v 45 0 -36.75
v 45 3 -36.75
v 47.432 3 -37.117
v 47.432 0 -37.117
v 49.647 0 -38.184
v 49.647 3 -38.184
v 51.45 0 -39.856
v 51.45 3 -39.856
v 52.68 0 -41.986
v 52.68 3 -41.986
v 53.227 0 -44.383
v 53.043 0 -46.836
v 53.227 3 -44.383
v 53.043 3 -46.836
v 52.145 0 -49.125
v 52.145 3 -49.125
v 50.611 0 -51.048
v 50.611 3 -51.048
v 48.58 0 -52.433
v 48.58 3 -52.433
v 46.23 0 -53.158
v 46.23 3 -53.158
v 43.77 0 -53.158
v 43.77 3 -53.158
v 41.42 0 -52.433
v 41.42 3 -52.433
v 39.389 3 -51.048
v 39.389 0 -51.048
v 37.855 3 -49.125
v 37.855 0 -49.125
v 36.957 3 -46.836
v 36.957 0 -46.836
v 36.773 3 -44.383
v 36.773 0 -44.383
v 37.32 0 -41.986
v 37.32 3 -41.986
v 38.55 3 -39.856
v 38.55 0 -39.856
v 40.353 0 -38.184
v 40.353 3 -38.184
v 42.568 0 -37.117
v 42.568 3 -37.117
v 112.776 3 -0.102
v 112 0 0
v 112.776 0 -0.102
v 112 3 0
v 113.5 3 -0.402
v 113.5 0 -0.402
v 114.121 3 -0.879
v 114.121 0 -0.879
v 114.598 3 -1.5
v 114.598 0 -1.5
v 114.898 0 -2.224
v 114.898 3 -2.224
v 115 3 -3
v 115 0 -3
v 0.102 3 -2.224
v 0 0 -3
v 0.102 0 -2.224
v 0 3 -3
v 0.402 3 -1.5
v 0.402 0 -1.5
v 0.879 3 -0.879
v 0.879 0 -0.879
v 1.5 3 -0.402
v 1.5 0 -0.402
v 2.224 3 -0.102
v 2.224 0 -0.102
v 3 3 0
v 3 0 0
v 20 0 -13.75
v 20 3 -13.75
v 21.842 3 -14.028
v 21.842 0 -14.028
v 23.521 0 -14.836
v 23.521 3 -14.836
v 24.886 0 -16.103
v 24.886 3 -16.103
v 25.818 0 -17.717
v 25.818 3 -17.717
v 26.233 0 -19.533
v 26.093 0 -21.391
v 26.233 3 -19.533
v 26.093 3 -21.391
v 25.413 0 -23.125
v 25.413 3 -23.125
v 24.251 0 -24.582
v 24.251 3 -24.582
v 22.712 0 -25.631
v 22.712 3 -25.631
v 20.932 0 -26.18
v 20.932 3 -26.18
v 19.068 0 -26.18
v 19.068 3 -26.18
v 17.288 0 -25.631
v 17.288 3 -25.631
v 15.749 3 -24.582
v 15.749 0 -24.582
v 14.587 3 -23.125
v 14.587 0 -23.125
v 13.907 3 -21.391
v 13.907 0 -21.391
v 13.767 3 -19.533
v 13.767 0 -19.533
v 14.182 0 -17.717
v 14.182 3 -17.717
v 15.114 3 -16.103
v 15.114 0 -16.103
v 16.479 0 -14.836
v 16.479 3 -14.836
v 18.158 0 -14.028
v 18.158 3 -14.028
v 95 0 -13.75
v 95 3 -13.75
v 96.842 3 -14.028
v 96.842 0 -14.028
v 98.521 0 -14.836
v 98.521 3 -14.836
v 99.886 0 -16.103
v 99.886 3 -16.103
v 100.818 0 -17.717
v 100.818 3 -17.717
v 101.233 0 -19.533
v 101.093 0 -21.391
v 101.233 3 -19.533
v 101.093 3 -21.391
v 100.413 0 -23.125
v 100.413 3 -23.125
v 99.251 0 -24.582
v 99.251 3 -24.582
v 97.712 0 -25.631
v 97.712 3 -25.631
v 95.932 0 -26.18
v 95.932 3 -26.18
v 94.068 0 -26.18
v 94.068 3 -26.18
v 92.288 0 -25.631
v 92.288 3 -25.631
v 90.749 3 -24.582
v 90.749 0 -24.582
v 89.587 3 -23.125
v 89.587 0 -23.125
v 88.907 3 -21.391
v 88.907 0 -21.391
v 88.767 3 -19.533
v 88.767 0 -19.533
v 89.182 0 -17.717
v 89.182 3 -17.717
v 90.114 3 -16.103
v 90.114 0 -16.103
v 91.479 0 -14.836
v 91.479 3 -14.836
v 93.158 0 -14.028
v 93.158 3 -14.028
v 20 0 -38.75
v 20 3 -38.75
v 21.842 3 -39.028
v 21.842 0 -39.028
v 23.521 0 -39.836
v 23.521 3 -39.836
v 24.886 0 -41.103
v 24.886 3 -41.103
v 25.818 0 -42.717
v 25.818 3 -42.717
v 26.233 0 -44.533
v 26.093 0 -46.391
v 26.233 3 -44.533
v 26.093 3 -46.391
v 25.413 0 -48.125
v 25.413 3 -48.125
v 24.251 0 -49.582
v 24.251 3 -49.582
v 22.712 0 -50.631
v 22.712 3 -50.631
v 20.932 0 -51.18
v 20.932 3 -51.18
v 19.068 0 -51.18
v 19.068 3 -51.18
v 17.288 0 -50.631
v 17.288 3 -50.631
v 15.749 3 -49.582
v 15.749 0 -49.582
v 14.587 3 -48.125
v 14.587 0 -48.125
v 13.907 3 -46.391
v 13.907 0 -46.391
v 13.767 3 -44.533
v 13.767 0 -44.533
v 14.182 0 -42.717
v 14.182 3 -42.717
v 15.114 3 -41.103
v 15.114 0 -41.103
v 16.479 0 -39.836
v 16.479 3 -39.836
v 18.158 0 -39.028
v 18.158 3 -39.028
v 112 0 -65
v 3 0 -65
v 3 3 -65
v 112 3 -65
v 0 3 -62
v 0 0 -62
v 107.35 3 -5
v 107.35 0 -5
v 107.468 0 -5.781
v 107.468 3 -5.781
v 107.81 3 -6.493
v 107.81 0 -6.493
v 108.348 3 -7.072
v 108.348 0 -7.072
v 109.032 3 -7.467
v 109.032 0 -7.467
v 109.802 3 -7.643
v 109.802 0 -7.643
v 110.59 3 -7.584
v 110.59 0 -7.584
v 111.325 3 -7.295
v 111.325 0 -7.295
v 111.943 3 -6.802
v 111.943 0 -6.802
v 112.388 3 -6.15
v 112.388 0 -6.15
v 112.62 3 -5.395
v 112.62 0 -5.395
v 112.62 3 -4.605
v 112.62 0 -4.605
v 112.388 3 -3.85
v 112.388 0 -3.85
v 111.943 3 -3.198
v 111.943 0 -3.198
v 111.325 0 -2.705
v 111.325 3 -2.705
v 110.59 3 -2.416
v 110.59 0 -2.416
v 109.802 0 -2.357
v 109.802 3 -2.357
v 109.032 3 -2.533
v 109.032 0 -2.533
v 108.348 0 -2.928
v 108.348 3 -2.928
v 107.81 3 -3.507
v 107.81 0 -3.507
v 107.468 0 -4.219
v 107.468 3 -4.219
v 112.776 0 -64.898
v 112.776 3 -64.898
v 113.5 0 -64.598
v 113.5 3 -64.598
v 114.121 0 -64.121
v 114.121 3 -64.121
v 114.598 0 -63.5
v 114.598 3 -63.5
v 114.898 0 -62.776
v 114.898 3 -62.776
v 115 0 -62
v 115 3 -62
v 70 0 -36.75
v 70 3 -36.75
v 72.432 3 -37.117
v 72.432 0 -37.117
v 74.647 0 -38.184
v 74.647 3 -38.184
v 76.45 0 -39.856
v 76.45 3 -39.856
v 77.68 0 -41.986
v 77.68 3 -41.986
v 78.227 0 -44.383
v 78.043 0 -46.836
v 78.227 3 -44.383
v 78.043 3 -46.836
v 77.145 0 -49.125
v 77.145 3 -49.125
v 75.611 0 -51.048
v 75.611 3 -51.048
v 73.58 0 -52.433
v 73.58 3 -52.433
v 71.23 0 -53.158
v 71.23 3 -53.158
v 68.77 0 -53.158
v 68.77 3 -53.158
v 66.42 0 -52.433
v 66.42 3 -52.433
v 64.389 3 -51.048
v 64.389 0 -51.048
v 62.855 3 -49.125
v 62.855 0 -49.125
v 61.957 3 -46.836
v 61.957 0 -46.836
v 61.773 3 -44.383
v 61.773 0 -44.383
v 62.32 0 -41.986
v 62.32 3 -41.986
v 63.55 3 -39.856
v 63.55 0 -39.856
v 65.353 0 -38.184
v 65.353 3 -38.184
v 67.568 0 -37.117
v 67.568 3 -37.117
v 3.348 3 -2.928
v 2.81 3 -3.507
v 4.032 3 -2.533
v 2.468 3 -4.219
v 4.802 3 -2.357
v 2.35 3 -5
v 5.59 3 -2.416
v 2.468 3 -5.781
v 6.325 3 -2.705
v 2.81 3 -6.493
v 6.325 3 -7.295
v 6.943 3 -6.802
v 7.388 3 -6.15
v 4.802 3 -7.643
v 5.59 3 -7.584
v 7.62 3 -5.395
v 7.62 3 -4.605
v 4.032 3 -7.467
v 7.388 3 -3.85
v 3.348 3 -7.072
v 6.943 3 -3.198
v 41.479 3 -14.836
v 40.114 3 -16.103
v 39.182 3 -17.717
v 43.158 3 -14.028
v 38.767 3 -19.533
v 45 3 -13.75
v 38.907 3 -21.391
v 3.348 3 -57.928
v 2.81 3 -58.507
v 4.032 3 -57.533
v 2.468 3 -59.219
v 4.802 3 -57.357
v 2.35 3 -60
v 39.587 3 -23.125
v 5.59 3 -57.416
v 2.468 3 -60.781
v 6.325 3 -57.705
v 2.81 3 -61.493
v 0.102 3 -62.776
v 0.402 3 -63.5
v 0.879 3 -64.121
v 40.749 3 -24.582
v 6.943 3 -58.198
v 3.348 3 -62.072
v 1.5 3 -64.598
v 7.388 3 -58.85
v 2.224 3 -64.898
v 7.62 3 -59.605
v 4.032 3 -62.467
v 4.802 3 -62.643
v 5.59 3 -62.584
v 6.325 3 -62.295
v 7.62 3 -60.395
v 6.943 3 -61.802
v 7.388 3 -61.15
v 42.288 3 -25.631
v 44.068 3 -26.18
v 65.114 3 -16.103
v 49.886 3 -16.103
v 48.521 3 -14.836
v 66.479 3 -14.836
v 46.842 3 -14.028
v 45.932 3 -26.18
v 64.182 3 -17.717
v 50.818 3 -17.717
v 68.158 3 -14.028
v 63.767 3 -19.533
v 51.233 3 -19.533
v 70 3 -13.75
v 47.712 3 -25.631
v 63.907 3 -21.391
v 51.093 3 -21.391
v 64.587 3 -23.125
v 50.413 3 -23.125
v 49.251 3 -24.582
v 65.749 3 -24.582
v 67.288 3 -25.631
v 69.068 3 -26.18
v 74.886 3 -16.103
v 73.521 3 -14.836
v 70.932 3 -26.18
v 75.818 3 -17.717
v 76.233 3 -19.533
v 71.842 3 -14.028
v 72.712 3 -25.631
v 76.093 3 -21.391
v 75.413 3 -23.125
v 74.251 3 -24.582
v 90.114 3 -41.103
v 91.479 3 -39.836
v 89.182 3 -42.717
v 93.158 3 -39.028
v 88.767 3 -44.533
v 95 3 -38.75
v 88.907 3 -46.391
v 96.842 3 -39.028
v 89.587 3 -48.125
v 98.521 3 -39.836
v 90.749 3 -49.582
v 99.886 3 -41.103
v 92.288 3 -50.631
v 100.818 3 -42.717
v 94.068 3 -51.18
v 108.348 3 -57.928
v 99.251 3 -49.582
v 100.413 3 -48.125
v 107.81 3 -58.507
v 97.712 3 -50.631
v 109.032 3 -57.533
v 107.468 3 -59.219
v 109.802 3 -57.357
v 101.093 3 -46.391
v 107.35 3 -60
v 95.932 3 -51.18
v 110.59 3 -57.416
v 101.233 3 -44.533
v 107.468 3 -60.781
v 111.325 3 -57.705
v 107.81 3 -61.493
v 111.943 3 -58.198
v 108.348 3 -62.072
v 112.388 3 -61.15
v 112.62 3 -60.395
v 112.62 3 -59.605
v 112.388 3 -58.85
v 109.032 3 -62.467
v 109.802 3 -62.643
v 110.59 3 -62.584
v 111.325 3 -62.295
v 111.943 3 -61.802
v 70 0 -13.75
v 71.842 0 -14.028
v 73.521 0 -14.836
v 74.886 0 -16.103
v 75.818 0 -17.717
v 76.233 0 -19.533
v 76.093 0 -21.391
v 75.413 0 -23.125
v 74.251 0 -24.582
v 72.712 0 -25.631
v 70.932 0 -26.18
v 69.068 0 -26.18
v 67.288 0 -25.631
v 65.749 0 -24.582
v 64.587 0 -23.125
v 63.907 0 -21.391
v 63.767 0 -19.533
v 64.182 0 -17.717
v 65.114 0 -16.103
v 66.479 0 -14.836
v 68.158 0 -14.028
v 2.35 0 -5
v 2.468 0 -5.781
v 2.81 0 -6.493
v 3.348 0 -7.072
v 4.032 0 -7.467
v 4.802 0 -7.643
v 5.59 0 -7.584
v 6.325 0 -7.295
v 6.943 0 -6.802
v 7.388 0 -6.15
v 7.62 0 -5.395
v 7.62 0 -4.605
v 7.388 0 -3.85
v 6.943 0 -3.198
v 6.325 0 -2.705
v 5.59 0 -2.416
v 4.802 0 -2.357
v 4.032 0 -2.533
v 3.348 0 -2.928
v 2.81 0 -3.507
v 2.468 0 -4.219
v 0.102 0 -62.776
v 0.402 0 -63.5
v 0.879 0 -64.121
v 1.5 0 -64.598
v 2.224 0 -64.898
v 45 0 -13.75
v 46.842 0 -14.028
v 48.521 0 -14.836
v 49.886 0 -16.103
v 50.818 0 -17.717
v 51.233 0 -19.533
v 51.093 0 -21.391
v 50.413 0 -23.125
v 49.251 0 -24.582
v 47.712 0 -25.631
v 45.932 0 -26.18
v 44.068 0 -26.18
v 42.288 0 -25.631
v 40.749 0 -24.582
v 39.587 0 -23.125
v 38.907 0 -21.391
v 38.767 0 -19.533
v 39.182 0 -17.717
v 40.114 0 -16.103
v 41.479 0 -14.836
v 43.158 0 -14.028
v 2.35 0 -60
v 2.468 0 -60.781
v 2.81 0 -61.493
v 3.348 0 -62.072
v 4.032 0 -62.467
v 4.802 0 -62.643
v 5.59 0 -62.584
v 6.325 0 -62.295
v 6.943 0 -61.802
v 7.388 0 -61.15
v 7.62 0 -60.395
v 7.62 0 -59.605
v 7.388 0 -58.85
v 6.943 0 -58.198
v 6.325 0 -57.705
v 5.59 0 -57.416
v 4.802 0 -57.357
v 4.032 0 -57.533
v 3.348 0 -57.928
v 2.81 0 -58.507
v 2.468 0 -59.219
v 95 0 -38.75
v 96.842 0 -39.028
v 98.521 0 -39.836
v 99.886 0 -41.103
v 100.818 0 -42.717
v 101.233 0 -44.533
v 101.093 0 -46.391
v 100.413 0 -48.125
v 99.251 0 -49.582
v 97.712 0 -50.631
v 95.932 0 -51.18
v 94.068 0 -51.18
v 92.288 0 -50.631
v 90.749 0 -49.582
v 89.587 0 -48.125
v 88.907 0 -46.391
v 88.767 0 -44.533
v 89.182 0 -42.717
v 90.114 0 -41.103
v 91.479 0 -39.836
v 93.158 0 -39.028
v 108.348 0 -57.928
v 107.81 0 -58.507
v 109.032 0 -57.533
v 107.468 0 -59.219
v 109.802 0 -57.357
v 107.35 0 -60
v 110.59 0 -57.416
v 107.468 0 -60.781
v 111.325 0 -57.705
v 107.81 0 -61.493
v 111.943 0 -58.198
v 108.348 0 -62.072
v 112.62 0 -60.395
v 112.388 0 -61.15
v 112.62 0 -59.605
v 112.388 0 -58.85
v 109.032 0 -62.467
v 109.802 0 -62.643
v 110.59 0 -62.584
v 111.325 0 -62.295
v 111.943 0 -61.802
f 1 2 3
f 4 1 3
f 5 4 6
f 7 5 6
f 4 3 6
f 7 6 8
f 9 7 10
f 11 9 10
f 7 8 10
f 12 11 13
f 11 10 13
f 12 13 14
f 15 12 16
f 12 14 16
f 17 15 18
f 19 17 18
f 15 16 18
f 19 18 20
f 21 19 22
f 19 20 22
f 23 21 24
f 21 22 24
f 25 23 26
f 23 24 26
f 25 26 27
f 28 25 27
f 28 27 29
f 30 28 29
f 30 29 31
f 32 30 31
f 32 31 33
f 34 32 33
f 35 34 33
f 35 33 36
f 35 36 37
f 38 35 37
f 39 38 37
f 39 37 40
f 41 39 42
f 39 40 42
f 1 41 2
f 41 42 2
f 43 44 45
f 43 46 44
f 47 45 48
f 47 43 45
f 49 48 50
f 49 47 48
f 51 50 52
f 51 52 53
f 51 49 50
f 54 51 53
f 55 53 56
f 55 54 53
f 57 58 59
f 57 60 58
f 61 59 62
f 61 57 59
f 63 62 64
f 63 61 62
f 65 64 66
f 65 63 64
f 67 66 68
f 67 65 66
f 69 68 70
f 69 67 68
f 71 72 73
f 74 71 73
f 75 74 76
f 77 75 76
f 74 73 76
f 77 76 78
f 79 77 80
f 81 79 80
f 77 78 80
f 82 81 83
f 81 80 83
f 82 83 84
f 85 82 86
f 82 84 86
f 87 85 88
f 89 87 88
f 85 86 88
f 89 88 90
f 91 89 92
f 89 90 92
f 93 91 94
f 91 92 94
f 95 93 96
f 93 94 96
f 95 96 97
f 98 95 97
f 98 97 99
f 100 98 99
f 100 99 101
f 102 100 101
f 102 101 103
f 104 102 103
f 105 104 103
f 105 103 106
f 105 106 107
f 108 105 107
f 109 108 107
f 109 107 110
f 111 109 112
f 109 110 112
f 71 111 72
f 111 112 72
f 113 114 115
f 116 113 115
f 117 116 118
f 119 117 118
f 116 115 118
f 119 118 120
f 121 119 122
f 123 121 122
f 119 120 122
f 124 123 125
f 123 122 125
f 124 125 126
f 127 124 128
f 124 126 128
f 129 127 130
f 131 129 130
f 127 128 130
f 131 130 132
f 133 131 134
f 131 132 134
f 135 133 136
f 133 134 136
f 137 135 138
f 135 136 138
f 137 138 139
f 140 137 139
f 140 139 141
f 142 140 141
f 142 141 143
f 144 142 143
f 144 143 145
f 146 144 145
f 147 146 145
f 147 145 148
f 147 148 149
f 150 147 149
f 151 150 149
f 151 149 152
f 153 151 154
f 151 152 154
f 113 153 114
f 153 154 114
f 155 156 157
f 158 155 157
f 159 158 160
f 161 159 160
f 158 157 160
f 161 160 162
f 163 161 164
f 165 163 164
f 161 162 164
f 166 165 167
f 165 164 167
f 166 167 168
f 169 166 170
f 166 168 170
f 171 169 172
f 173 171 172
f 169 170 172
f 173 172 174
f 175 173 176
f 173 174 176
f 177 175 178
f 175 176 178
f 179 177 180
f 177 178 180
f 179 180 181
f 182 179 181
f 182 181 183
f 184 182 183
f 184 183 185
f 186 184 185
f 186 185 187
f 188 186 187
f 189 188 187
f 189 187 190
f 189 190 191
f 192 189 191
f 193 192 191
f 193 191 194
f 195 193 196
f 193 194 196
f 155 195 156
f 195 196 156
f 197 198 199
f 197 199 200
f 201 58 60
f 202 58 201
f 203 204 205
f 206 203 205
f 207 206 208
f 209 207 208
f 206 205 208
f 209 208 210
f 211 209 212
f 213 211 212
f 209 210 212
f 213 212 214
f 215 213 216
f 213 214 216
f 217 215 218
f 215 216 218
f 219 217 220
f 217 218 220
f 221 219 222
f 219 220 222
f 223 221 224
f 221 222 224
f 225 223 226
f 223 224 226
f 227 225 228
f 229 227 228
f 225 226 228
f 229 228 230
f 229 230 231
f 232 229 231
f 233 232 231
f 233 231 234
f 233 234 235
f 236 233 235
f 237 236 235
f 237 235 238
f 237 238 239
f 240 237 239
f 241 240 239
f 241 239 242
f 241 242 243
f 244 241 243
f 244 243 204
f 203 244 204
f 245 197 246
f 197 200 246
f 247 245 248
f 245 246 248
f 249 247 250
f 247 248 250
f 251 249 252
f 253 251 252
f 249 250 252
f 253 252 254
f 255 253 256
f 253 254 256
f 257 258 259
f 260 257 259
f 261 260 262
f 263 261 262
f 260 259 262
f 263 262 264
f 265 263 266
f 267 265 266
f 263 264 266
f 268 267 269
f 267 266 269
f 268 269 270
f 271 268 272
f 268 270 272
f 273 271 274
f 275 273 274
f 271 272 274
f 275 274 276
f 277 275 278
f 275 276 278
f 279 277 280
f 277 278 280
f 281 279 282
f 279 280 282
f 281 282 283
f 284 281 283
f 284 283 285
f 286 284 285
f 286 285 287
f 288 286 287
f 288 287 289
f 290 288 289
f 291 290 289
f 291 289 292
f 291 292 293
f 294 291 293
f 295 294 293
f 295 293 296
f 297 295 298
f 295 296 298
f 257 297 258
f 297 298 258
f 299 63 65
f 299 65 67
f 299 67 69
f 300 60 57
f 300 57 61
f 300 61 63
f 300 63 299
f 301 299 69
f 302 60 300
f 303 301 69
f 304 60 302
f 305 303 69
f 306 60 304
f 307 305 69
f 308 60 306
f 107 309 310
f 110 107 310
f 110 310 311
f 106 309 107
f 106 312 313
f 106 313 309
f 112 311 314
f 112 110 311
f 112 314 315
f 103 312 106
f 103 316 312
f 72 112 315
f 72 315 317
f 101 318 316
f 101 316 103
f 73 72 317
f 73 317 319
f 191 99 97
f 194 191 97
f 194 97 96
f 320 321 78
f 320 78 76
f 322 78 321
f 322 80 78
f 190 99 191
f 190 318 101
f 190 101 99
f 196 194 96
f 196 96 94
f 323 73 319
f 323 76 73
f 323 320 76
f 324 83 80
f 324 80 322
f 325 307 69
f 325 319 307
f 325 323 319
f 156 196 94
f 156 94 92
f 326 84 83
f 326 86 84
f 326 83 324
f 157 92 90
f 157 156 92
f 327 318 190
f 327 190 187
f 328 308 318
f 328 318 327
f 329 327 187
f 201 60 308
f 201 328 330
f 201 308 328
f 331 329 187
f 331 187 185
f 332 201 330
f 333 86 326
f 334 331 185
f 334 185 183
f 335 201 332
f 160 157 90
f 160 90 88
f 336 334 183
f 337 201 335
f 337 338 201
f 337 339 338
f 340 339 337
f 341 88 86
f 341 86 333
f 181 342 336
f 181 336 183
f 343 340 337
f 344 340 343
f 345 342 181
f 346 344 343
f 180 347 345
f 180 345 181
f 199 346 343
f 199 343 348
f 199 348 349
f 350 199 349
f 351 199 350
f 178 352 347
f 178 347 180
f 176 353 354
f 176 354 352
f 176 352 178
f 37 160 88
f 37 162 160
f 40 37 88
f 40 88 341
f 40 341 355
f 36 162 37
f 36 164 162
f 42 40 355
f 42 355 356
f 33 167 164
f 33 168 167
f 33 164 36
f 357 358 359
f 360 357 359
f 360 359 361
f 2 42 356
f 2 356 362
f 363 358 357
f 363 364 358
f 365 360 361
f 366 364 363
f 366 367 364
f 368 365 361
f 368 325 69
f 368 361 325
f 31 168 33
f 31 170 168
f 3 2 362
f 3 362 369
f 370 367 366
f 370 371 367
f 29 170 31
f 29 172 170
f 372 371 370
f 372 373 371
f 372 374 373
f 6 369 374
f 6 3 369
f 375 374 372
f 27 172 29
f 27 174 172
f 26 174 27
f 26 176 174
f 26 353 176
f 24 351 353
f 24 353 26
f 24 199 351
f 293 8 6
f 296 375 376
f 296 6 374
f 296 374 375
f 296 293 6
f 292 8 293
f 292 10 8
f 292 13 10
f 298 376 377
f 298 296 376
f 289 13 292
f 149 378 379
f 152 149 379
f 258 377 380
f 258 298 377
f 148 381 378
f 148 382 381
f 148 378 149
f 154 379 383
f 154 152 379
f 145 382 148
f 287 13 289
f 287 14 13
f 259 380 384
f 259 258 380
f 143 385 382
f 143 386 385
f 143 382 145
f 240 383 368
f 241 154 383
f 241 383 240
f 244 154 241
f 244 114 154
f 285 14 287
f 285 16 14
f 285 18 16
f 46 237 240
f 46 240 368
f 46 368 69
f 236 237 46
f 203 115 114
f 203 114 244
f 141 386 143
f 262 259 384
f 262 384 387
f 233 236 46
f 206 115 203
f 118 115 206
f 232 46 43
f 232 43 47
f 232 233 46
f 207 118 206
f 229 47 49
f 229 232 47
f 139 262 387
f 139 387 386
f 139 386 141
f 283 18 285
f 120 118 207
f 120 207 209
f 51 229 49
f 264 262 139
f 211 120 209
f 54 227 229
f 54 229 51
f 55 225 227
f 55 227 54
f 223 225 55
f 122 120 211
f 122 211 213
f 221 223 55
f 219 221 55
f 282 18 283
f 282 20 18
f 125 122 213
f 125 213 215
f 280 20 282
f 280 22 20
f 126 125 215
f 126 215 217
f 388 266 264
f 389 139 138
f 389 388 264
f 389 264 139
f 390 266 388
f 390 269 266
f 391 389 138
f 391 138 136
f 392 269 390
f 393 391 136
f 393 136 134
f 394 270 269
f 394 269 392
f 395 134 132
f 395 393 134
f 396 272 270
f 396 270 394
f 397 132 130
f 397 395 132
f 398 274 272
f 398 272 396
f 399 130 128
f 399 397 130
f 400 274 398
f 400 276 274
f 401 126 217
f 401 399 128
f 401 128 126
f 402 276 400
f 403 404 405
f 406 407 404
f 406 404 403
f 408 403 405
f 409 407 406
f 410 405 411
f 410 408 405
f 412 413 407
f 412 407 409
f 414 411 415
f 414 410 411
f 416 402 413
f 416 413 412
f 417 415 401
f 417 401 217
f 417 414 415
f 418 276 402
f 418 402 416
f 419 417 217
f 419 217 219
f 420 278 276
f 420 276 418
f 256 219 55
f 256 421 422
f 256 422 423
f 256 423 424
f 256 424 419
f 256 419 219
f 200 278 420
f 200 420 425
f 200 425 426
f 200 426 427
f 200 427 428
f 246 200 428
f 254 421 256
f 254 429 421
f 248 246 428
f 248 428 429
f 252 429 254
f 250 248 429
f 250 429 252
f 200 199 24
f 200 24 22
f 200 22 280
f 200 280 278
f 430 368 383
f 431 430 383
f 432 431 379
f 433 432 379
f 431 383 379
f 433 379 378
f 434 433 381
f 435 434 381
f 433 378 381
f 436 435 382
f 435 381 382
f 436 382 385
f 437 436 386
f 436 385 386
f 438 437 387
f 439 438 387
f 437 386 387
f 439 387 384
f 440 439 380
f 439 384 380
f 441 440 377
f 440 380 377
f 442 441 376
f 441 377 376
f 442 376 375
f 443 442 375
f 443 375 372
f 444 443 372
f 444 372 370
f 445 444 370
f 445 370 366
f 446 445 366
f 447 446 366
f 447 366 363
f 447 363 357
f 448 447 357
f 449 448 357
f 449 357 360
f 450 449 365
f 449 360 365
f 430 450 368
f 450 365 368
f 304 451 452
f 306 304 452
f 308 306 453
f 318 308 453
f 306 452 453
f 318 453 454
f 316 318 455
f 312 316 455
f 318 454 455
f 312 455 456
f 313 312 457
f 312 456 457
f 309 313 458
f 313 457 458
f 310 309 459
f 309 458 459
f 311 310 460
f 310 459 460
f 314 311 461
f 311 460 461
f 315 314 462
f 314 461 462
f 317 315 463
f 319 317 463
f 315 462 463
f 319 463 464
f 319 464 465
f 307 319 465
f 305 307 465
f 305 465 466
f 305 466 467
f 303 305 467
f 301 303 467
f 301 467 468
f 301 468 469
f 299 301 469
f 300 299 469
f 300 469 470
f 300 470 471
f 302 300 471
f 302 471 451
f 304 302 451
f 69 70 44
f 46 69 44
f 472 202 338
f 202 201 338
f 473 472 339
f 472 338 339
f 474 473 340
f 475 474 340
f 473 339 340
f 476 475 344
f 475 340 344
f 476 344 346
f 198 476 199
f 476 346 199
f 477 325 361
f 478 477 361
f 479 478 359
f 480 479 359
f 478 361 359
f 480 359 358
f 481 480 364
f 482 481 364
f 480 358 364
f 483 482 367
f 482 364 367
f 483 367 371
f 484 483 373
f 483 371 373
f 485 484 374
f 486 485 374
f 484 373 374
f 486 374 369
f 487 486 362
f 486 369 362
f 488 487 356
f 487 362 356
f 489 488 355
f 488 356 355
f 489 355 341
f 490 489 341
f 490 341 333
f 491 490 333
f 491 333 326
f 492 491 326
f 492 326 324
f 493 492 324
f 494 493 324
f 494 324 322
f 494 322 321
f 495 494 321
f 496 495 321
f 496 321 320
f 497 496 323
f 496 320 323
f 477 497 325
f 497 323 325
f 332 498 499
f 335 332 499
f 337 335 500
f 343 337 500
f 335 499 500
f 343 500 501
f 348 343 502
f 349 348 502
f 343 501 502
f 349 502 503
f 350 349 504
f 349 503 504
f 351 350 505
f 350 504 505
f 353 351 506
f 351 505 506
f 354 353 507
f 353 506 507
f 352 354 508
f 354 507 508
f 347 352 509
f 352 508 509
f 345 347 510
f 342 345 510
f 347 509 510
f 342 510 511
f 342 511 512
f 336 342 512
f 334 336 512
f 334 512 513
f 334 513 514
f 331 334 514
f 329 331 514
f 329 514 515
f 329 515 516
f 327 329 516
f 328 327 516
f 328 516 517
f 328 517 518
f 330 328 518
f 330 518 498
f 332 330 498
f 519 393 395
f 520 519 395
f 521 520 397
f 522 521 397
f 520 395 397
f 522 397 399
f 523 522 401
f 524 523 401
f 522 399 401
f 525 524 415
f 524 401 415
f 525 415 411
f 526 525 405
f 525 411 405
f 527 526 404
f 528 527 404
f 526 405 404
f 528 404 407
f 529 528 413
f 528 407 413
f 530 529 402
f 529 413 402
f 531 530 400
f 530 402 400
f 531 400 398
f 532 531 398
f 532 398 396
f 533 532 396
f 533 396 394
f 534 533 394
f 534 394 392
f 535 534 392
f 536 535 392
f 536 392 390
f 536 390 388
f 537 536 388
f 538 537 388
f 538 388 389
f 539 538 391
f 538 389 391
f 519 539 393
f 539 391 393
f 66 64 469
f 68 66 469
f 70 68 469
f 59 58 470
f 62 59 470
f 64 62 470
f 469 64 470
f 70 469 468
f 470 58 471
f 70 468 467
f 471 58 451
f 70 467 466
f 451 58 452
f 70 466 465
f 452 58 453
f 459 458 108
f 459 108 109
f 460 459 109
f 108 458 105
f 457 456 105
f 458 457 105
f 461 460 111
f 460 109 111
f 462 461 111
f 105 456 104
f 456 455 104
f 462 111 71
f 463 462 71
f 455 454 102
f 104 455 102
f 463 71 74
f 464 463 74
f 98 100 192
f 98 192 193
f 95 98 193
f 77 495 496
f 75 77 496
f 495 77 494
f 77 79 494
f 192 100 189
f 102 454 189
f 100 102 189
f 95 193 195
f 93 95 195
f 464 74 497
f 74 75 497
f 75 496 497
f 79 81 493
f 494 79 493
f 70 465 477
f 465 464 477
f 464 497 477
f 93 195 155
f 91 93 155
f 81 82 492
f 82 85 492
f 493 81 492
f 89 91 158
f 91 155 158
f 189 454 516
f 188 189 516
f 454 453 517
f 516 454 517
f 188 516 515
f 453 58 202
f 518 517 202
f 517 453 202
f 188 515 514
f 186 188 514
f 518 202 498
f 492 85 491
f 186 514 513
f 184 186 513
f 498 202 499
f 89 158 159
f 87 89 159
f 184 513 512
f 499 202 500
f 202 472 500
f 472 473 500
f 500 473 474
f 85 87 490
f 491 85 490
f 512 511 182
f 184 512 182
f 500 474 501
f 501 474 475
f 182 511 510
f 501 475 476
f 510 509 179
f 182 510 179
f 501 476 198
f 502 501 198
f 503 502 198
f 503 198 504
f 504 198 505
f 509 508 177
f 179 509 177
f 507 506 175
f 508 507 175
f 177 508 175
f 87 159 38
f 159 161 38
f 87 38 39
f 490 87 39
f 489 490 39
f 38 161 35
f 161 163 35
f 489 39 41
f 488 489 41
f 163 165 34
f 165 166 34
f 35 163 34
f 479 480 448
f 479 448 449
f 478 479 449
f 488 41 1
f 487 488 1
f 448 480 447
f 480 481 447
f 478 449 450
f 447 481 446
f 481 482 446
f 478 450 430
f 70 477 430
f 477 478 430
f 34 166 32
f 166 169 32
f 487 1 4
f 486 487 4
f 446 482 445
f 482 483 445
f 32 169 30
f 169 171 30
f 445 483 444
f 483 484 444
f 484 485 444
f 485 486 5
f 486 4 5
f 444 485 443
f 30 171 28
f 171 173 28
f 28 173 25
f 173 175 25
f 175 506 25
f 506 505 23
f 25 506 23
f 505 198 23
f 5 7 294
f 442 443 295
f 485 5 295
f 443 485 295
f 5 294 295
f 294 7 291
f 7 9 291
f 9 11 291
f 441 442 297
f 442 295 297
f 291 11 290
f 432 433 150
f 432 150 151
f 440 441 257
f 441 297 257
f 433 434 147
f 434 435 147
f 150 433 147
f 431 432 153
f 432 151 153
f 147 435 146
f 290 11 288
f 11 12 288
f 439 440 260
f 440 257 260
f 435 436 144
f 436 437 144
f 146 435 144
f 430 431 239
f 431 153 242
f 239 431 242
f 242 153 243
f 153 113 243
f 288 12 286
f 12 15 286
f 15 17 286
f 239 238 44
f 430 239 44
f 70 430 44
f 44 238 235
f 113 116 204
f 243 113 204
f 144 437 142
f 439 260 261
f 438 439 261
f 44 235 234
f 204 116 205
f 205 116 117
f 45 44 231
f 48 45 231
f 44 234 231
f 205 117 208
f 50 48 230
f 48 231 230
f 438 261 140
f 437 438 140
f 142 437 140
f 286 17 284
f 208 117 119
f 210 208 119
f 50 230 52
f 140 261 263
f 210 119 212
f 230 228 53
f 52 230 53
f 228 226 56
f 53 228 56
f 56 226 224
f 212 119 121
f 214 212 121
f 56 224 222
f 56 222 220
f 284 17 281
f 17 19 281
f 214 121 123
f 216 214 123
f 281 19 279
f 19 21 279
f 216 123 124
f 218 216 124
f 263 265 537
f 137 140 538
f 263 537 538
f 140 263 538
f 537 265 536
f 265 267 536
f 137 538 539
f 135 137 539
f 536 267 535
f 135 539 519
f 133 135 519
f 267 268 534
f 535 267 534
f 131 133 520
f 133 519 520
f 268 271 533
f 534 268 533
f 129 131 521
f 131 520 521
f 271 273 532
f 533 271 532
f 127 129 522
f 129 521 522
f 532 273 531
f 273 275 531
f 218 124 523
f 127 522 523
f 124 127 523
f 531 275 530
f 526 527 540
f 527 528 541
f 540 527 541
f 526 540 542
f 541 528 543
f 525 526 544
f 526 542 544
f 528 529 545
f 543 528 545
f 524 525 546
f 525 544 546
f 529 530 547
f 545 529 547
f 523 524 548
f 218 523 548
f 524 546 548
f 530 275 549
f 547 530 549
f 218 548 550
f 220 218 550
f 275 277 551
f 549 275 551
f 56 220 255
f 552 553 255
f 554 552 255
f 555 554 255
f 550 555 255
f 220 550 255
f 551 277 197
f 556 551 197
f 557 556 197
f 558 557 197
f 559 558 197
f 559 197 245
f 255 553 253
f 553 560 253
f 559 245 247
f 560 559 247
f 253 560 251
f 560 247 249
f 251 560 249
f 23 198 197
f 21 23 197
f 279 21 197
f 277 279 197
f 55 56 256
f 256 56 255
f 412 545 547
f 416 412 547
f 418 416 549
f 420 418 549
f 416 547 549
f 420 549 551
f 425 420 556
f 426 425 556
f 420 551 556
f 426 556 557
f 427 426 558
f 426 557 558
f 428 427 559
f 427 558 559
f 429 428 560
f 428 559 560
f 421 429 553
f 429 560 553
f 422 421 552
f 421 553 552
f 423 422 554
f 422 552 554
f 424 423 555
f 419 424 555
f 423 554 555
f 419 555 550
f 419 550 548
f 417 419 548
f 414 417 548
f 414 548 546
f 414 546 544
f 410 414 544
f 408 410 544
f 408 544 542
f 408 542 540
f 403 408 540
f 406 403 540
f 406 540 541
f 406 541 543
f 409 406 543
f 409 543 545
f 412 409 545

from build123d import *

# Parameters (mm, degrees)
SKETCH1_W            = 115
SKETCH1_H            = 65
BOSS_EXTRUDE1_DEPTH  = 3
SKETCH2_R            = 6.25
CUT_EXTRUDE1_DEPTH   = 3
LPATTERN1_COUNT      = 4
LPATTERN1_PITCH      = 25
LPATTERN1_COUNT_DIR2 = 2
LPATTERN1_PITCH_DIR2 = 25
SKETCH3_R            = 8.25
CUT_EXTRUDE2_DEPTH   = 3
M5_CLEARANCE_HOLE1_D = 5.3
FILLET1_R            = 3


with BuildPart() as part:
    # Sketch1 → Boss-Extrude1 (new body)
    with BuildSketch(Plane(origin=(0, 0, 0), x_dir=(1, 0, 0), z_dir=(0, 1, 0))):
        with Locations((57.5, 32.5)):
            Rectangle(SKETCH1_W, SKETCH1_H)
    extrude(amount=BOSS_EXTRUDE1_DEPTH)

    # Sketch2 → Cut-Extrude1 (cut)
    with BuildSketch(Plane(origin=(0, 3, 0), x_dir=(1, 0, 0), z_dir=(0, 1, 0))):
        with Locations(Location((20, 20, 0), (0, 0, 270))):
            Circle(SKETCH2_R)
    cut_extrude1 = extrude(amount=-CUT_EXTRUDE1_DEPTH, mode=Mode.SUBTRACT)

    # LPattern1: Cut-Extrude1 4 × 2, 2 skipped
    with Locations(*[(i * LPATTERN1_PITCH, 0, -j * LPATTERN1_PITCH_DIR2) for i in range(LPATTERN1_COUNT) for j in range(LPATTERN1_COUNT_DIR2) if (i, j) not in ((0, 0), (1, 1), (2, 1))]):
        add(cut_extrude1, mode=Mode.SUBTRACT)

    # Sketch3 → Cut-Extrude2 (cut)
    with BuildSketch(Plane(origin=(0, 3, 0), x_dir=(1, 0, 0), z_dir=(0, 1, 0))):
        with Locations(Location((45, 45, 0), (0, 0, 270))):
            Circle(SKETCH3_R)
        with Locations(Location((70, 45, 0), (0, 0, 270))):
            Circle(SKETCH3_R)
    extrude(amount=-CUT_EXTRUDE2_DEPTH, mode=Mode.SUBTRACT)

    # M5 Clearance Hole1 (through all)
    with Locations(Plane(origin=(0, 3, 0), x_dir=(1, 0, 0), z_dir=(0, 1, 0))):
        with Locations((5, 60), (5, 5), (110, 5), (110, 60)):
            Hole(M5_CLEARANCE_HOLE1_D / 2)

    # Fillet1
    fillet1_edges = [part.edges().sort_by_distance(p)[0] for p in [
        (0, 1.5, -65),
        (115, 1.5, -65),
        (115, 1.5, 0),
        (0, 1.5, 0),
    ]]
    fillet(fillet1_edges, radius=FILLET1_R)


solid = part.part
